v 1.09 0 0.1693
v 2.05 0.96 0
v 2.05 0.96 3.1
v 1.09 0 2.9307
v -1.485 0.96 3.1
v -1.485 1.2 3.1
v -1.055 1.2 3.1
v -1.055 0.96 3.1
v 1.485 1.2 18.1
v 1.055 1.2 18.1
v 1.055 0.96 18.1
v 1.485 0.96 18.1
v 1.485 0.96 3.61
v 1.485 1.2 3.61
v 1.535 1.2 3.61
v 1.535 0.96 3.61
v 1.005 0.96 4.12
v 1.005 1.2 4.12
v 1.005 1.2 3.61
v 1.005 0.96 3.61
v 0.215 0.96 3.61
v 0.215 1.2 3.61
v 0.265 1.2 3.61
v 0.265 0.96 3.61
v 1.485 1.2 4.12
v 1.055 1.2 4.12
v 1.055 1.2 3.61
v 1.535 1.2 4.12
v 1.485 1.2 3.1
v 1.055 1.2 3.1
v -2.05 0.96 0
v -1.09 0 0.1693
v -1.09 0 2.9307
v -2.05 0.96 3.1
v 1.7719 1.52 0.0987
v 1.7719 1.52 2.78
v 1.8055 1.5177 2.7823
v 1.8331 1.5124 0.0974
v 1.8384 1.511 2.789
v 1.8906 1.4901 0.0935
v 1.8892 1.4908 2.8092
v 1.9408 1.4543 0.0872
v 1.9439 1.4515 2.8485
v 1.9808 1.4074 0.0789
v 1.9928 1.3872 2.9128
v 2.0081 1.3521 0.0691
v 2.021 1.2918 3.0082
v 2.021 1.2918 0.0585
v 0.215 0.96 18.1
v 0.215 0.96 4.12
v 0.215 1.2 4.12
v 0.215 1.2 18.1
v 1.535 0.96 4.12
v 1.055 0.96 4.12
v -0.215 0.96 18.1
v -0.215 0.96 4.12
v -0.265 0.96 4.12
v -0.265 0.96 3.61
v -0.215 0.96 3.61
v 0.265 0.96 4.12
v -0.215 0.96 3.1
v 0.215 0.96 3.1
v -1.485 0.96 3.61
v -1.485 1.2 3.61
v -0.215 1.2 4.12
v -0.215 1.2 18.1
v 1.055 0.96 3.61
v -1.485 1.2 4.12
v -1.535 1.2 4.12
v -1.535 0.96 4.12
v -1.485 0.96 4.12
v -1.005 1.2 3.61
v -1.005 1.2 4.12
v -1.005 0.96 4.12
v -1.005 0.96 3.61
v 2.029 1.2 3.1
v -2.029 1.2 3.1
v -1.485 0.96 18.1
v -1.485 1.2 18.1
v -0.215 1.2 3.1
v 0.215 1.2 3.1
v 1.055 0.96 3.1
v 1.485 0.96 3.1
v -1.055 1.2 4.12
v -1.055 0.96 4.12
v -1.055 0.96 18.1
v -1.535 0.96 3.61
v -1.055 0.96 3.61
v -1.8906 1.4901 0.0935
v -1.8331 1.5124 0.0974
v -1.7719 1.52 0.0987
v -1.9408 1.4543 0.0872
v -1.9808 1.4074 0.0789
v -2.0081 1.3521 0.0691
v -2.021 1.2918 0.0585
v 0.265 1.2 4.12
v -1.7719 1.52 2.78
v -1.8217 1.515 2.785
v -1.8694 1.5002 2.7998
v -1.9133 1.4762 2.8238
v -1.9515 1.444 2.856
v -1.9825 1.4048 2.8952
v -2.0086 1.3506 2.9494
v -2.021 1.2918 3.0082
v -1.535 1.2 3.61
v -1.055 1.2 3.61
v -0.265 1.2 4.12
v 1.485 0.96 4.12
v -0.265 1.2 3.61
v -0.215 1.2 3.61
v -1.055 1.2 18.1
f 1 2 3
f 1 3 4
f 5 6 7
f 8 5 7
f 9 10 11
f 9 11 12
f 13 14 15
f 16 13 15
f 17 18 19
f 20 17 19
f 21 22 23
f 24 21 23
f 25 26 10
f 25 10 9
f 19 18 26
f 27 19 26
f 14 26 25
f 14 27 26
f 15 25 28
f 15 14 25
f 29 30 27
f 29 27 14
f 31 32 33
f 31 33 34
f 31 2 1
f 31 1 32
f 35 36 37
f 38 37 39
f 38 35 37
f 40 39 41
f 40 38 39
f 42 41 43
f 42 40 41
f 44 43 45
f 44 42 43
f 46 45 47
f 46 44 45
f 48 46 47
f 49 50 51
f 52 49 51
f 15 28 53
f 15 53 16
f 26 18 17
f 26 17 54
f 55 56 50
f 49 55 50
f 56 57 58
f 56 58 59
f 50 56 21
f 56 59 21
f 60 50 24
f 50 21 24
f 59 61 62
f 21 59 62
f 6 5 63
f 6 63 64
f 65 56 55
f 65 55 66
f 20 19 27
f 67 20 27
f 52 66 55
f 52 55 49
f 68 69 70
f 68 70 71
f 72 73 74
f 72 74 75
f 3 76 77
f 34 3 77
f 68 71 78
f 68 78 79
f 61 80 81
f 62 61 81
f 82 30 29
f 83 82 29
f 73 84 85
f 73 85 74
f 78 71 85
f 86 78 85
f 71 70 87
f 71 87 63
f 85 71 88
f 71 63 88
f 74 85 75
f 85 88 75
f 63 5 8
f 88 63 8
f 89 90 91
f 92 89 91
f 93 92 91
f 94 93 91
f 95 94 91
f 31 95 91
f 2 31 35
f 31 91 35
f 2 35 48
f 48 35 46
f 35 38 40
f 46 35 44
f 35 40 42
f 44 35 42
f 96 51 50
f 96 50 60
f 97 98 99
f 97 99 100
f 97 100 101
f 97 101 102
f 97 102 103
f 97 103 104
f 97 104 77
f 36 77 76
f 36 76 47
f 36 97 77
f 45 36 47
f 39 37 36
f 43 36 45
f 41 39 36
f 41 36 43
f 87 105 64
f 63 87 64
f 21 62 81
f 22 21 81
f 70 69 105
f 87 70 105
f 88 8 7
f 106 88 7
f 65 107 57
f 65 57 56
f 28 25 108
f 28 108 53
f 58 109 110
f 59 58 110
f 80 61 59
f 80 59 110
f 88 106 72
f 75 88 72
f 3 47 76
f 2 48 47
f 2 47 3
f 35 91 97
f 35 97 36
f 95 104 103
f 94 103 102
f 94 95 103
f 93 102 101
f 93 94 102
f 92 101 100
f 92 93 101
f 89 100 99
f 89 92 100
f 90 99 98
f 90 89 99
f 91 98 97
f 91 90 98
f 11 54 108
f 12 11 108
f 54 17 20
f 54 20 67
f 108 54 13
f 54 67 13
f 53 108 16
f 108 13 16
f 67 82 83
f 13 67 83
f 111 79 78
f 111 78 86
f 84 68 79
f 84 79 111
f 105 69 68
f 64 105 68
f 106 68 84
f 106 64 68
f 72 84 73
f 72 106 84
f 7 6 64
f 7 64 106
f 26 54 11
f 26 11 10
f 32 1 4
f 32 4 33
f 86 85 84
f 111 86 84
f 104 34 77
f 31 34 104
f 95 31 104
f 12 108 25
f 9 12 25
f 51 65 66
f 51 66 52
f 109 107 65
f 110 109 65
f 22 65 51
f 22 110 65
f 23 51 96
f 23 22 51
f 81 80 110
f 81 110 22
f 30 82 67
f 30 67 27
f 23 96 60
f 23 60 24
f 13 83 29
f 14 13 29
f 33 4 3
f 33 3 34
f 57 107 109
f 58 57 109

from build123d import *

# Parameters (mm, degrees)
BOSS_EXTRUDE1_DEPTH     = 3.1
BOSS_EXTRUDE2_OUTLINE_W = 0.43
BOSS_EXTRUDE2_OUTLINE_H = 0.24
BOSS_EXTRUDE2_DEPTH     = 15
SKETCH4_W               = 0.53
SKETCH4_H               = 0.51
BOSS_EXTRUDE3_DEPTH     = 0.24


# Read off the part's stored shape, not the designer's step: Boss-Extrude2
with BuildPart() as part:
    # Sketch1 → Boss-Extrude1 (new body)
    with BuildSketch(Plane.XY):
        with BuildLine():
            Line((-1.771923555, 1.52), (1.771923555, 1.52))
            ThreePointArc((1.771923555, 1.52), (1.940821107, 1.454319334), (2.020972229, 1.291788936))
            Line((2.020972229, 1.291788936), (2.05, 0.96))
            Line((2.05, 0.96), (1.09, 0))
            Line((1.09, 0), (-1.09, 0))
            Line((-1.09, 0), (-2.05, 0.96))
            Line((-2.05, 0.96), (-2.020972229, 1.291788936))
            ThreePointArc((-2.020972229, 1.291788936), (-1.940821107, 1.454319334), (-1.771923555, 1.52))
        make_face()
    extrude(amount=BOSS_EXTRUDE1_DEPTH)

    # SurfaceCut1
    split(bisect_by=Plane(origin=(0, 0.028947542, 0.164169669), x_dir=(-1, 0, 0), z_dir=(0, -0.17364817766693072, -0.984807753012208)), keep=Keep.BOTTOM)

    # SurfaceCut2
    split(bisect_by=Plane(origin=(0, -0.50118368, 2.842353893), x_dir=(-1, 0, 0), z_dir=(0, -0.17364817766693072, 0.984807753012208)), keep=Keep.BOTTOM)

    # SurfaceCut3
    split(bisect_by=Plane(origin=(0, 2.15, 2.15), x_dir=(1, 0, 0), z_dir=(0, 0.7071067811865488, 0.7071067811865464)), keep=Keep.BOTTOM)

    # SurfaceCut4
    split(bisect_by=Plane(origin=(0, 0.028947542, -0.164169669), x_dir=(1, 0, 0), z_dir=(0, -0.17364817766693072, 0.984807753012208)), keep=Keep.TOP)


with BuildPart() as body_2:
    # Boss-Extrude2 outline → Boss-Extrude2 (new body)
    with BuildSketch(Plane.XY.offset(3.1)):
        with Locations((1.27, 1.08)):
            Rectangle(BOSS_EXTRUDE2_OUTLINE_W, BOSS_EXTRUDE2_OUTLINE_H)
        with Locations((0, 1.08)):
            Rectangle(BOSS_EXTRUDE2_OUTLINE_W, BOSS_EXTRUDE2_OUTLINE_H)
        with Locations((-1.27, 1.08)):
            Rectangle(BOSS_EXTRUDE2_OUTLINE_W, BOSS_EXTRUDE2_OUTLINE_H)
    extrude(amount=BOSS_EXTRUDE2_DEPTH)

    # Sketch4 → Boss-Extrude3 (add)
    with BuildSketch(Plane(origin=(0, 1.2, 0), x_dir=(1, 0, 0), z_dir=(0, 1, 0))):
        with Locations((-1.27, -3.865)):
            Rectangle(SKETCH4_W, SKETCH4_H)
        with Locations((0, -3.865)):
            Rectangle(SKETCH4_W, SKETCH4_H)
        with Locations((1.27, -3.865)):
            Rectangle(SKETCH4_W, SKETCH4_H)
    extrude(amount=-BOSS_EXTRUDE3_DEPTH)


solid = Compound([part.part, body_2.part])
